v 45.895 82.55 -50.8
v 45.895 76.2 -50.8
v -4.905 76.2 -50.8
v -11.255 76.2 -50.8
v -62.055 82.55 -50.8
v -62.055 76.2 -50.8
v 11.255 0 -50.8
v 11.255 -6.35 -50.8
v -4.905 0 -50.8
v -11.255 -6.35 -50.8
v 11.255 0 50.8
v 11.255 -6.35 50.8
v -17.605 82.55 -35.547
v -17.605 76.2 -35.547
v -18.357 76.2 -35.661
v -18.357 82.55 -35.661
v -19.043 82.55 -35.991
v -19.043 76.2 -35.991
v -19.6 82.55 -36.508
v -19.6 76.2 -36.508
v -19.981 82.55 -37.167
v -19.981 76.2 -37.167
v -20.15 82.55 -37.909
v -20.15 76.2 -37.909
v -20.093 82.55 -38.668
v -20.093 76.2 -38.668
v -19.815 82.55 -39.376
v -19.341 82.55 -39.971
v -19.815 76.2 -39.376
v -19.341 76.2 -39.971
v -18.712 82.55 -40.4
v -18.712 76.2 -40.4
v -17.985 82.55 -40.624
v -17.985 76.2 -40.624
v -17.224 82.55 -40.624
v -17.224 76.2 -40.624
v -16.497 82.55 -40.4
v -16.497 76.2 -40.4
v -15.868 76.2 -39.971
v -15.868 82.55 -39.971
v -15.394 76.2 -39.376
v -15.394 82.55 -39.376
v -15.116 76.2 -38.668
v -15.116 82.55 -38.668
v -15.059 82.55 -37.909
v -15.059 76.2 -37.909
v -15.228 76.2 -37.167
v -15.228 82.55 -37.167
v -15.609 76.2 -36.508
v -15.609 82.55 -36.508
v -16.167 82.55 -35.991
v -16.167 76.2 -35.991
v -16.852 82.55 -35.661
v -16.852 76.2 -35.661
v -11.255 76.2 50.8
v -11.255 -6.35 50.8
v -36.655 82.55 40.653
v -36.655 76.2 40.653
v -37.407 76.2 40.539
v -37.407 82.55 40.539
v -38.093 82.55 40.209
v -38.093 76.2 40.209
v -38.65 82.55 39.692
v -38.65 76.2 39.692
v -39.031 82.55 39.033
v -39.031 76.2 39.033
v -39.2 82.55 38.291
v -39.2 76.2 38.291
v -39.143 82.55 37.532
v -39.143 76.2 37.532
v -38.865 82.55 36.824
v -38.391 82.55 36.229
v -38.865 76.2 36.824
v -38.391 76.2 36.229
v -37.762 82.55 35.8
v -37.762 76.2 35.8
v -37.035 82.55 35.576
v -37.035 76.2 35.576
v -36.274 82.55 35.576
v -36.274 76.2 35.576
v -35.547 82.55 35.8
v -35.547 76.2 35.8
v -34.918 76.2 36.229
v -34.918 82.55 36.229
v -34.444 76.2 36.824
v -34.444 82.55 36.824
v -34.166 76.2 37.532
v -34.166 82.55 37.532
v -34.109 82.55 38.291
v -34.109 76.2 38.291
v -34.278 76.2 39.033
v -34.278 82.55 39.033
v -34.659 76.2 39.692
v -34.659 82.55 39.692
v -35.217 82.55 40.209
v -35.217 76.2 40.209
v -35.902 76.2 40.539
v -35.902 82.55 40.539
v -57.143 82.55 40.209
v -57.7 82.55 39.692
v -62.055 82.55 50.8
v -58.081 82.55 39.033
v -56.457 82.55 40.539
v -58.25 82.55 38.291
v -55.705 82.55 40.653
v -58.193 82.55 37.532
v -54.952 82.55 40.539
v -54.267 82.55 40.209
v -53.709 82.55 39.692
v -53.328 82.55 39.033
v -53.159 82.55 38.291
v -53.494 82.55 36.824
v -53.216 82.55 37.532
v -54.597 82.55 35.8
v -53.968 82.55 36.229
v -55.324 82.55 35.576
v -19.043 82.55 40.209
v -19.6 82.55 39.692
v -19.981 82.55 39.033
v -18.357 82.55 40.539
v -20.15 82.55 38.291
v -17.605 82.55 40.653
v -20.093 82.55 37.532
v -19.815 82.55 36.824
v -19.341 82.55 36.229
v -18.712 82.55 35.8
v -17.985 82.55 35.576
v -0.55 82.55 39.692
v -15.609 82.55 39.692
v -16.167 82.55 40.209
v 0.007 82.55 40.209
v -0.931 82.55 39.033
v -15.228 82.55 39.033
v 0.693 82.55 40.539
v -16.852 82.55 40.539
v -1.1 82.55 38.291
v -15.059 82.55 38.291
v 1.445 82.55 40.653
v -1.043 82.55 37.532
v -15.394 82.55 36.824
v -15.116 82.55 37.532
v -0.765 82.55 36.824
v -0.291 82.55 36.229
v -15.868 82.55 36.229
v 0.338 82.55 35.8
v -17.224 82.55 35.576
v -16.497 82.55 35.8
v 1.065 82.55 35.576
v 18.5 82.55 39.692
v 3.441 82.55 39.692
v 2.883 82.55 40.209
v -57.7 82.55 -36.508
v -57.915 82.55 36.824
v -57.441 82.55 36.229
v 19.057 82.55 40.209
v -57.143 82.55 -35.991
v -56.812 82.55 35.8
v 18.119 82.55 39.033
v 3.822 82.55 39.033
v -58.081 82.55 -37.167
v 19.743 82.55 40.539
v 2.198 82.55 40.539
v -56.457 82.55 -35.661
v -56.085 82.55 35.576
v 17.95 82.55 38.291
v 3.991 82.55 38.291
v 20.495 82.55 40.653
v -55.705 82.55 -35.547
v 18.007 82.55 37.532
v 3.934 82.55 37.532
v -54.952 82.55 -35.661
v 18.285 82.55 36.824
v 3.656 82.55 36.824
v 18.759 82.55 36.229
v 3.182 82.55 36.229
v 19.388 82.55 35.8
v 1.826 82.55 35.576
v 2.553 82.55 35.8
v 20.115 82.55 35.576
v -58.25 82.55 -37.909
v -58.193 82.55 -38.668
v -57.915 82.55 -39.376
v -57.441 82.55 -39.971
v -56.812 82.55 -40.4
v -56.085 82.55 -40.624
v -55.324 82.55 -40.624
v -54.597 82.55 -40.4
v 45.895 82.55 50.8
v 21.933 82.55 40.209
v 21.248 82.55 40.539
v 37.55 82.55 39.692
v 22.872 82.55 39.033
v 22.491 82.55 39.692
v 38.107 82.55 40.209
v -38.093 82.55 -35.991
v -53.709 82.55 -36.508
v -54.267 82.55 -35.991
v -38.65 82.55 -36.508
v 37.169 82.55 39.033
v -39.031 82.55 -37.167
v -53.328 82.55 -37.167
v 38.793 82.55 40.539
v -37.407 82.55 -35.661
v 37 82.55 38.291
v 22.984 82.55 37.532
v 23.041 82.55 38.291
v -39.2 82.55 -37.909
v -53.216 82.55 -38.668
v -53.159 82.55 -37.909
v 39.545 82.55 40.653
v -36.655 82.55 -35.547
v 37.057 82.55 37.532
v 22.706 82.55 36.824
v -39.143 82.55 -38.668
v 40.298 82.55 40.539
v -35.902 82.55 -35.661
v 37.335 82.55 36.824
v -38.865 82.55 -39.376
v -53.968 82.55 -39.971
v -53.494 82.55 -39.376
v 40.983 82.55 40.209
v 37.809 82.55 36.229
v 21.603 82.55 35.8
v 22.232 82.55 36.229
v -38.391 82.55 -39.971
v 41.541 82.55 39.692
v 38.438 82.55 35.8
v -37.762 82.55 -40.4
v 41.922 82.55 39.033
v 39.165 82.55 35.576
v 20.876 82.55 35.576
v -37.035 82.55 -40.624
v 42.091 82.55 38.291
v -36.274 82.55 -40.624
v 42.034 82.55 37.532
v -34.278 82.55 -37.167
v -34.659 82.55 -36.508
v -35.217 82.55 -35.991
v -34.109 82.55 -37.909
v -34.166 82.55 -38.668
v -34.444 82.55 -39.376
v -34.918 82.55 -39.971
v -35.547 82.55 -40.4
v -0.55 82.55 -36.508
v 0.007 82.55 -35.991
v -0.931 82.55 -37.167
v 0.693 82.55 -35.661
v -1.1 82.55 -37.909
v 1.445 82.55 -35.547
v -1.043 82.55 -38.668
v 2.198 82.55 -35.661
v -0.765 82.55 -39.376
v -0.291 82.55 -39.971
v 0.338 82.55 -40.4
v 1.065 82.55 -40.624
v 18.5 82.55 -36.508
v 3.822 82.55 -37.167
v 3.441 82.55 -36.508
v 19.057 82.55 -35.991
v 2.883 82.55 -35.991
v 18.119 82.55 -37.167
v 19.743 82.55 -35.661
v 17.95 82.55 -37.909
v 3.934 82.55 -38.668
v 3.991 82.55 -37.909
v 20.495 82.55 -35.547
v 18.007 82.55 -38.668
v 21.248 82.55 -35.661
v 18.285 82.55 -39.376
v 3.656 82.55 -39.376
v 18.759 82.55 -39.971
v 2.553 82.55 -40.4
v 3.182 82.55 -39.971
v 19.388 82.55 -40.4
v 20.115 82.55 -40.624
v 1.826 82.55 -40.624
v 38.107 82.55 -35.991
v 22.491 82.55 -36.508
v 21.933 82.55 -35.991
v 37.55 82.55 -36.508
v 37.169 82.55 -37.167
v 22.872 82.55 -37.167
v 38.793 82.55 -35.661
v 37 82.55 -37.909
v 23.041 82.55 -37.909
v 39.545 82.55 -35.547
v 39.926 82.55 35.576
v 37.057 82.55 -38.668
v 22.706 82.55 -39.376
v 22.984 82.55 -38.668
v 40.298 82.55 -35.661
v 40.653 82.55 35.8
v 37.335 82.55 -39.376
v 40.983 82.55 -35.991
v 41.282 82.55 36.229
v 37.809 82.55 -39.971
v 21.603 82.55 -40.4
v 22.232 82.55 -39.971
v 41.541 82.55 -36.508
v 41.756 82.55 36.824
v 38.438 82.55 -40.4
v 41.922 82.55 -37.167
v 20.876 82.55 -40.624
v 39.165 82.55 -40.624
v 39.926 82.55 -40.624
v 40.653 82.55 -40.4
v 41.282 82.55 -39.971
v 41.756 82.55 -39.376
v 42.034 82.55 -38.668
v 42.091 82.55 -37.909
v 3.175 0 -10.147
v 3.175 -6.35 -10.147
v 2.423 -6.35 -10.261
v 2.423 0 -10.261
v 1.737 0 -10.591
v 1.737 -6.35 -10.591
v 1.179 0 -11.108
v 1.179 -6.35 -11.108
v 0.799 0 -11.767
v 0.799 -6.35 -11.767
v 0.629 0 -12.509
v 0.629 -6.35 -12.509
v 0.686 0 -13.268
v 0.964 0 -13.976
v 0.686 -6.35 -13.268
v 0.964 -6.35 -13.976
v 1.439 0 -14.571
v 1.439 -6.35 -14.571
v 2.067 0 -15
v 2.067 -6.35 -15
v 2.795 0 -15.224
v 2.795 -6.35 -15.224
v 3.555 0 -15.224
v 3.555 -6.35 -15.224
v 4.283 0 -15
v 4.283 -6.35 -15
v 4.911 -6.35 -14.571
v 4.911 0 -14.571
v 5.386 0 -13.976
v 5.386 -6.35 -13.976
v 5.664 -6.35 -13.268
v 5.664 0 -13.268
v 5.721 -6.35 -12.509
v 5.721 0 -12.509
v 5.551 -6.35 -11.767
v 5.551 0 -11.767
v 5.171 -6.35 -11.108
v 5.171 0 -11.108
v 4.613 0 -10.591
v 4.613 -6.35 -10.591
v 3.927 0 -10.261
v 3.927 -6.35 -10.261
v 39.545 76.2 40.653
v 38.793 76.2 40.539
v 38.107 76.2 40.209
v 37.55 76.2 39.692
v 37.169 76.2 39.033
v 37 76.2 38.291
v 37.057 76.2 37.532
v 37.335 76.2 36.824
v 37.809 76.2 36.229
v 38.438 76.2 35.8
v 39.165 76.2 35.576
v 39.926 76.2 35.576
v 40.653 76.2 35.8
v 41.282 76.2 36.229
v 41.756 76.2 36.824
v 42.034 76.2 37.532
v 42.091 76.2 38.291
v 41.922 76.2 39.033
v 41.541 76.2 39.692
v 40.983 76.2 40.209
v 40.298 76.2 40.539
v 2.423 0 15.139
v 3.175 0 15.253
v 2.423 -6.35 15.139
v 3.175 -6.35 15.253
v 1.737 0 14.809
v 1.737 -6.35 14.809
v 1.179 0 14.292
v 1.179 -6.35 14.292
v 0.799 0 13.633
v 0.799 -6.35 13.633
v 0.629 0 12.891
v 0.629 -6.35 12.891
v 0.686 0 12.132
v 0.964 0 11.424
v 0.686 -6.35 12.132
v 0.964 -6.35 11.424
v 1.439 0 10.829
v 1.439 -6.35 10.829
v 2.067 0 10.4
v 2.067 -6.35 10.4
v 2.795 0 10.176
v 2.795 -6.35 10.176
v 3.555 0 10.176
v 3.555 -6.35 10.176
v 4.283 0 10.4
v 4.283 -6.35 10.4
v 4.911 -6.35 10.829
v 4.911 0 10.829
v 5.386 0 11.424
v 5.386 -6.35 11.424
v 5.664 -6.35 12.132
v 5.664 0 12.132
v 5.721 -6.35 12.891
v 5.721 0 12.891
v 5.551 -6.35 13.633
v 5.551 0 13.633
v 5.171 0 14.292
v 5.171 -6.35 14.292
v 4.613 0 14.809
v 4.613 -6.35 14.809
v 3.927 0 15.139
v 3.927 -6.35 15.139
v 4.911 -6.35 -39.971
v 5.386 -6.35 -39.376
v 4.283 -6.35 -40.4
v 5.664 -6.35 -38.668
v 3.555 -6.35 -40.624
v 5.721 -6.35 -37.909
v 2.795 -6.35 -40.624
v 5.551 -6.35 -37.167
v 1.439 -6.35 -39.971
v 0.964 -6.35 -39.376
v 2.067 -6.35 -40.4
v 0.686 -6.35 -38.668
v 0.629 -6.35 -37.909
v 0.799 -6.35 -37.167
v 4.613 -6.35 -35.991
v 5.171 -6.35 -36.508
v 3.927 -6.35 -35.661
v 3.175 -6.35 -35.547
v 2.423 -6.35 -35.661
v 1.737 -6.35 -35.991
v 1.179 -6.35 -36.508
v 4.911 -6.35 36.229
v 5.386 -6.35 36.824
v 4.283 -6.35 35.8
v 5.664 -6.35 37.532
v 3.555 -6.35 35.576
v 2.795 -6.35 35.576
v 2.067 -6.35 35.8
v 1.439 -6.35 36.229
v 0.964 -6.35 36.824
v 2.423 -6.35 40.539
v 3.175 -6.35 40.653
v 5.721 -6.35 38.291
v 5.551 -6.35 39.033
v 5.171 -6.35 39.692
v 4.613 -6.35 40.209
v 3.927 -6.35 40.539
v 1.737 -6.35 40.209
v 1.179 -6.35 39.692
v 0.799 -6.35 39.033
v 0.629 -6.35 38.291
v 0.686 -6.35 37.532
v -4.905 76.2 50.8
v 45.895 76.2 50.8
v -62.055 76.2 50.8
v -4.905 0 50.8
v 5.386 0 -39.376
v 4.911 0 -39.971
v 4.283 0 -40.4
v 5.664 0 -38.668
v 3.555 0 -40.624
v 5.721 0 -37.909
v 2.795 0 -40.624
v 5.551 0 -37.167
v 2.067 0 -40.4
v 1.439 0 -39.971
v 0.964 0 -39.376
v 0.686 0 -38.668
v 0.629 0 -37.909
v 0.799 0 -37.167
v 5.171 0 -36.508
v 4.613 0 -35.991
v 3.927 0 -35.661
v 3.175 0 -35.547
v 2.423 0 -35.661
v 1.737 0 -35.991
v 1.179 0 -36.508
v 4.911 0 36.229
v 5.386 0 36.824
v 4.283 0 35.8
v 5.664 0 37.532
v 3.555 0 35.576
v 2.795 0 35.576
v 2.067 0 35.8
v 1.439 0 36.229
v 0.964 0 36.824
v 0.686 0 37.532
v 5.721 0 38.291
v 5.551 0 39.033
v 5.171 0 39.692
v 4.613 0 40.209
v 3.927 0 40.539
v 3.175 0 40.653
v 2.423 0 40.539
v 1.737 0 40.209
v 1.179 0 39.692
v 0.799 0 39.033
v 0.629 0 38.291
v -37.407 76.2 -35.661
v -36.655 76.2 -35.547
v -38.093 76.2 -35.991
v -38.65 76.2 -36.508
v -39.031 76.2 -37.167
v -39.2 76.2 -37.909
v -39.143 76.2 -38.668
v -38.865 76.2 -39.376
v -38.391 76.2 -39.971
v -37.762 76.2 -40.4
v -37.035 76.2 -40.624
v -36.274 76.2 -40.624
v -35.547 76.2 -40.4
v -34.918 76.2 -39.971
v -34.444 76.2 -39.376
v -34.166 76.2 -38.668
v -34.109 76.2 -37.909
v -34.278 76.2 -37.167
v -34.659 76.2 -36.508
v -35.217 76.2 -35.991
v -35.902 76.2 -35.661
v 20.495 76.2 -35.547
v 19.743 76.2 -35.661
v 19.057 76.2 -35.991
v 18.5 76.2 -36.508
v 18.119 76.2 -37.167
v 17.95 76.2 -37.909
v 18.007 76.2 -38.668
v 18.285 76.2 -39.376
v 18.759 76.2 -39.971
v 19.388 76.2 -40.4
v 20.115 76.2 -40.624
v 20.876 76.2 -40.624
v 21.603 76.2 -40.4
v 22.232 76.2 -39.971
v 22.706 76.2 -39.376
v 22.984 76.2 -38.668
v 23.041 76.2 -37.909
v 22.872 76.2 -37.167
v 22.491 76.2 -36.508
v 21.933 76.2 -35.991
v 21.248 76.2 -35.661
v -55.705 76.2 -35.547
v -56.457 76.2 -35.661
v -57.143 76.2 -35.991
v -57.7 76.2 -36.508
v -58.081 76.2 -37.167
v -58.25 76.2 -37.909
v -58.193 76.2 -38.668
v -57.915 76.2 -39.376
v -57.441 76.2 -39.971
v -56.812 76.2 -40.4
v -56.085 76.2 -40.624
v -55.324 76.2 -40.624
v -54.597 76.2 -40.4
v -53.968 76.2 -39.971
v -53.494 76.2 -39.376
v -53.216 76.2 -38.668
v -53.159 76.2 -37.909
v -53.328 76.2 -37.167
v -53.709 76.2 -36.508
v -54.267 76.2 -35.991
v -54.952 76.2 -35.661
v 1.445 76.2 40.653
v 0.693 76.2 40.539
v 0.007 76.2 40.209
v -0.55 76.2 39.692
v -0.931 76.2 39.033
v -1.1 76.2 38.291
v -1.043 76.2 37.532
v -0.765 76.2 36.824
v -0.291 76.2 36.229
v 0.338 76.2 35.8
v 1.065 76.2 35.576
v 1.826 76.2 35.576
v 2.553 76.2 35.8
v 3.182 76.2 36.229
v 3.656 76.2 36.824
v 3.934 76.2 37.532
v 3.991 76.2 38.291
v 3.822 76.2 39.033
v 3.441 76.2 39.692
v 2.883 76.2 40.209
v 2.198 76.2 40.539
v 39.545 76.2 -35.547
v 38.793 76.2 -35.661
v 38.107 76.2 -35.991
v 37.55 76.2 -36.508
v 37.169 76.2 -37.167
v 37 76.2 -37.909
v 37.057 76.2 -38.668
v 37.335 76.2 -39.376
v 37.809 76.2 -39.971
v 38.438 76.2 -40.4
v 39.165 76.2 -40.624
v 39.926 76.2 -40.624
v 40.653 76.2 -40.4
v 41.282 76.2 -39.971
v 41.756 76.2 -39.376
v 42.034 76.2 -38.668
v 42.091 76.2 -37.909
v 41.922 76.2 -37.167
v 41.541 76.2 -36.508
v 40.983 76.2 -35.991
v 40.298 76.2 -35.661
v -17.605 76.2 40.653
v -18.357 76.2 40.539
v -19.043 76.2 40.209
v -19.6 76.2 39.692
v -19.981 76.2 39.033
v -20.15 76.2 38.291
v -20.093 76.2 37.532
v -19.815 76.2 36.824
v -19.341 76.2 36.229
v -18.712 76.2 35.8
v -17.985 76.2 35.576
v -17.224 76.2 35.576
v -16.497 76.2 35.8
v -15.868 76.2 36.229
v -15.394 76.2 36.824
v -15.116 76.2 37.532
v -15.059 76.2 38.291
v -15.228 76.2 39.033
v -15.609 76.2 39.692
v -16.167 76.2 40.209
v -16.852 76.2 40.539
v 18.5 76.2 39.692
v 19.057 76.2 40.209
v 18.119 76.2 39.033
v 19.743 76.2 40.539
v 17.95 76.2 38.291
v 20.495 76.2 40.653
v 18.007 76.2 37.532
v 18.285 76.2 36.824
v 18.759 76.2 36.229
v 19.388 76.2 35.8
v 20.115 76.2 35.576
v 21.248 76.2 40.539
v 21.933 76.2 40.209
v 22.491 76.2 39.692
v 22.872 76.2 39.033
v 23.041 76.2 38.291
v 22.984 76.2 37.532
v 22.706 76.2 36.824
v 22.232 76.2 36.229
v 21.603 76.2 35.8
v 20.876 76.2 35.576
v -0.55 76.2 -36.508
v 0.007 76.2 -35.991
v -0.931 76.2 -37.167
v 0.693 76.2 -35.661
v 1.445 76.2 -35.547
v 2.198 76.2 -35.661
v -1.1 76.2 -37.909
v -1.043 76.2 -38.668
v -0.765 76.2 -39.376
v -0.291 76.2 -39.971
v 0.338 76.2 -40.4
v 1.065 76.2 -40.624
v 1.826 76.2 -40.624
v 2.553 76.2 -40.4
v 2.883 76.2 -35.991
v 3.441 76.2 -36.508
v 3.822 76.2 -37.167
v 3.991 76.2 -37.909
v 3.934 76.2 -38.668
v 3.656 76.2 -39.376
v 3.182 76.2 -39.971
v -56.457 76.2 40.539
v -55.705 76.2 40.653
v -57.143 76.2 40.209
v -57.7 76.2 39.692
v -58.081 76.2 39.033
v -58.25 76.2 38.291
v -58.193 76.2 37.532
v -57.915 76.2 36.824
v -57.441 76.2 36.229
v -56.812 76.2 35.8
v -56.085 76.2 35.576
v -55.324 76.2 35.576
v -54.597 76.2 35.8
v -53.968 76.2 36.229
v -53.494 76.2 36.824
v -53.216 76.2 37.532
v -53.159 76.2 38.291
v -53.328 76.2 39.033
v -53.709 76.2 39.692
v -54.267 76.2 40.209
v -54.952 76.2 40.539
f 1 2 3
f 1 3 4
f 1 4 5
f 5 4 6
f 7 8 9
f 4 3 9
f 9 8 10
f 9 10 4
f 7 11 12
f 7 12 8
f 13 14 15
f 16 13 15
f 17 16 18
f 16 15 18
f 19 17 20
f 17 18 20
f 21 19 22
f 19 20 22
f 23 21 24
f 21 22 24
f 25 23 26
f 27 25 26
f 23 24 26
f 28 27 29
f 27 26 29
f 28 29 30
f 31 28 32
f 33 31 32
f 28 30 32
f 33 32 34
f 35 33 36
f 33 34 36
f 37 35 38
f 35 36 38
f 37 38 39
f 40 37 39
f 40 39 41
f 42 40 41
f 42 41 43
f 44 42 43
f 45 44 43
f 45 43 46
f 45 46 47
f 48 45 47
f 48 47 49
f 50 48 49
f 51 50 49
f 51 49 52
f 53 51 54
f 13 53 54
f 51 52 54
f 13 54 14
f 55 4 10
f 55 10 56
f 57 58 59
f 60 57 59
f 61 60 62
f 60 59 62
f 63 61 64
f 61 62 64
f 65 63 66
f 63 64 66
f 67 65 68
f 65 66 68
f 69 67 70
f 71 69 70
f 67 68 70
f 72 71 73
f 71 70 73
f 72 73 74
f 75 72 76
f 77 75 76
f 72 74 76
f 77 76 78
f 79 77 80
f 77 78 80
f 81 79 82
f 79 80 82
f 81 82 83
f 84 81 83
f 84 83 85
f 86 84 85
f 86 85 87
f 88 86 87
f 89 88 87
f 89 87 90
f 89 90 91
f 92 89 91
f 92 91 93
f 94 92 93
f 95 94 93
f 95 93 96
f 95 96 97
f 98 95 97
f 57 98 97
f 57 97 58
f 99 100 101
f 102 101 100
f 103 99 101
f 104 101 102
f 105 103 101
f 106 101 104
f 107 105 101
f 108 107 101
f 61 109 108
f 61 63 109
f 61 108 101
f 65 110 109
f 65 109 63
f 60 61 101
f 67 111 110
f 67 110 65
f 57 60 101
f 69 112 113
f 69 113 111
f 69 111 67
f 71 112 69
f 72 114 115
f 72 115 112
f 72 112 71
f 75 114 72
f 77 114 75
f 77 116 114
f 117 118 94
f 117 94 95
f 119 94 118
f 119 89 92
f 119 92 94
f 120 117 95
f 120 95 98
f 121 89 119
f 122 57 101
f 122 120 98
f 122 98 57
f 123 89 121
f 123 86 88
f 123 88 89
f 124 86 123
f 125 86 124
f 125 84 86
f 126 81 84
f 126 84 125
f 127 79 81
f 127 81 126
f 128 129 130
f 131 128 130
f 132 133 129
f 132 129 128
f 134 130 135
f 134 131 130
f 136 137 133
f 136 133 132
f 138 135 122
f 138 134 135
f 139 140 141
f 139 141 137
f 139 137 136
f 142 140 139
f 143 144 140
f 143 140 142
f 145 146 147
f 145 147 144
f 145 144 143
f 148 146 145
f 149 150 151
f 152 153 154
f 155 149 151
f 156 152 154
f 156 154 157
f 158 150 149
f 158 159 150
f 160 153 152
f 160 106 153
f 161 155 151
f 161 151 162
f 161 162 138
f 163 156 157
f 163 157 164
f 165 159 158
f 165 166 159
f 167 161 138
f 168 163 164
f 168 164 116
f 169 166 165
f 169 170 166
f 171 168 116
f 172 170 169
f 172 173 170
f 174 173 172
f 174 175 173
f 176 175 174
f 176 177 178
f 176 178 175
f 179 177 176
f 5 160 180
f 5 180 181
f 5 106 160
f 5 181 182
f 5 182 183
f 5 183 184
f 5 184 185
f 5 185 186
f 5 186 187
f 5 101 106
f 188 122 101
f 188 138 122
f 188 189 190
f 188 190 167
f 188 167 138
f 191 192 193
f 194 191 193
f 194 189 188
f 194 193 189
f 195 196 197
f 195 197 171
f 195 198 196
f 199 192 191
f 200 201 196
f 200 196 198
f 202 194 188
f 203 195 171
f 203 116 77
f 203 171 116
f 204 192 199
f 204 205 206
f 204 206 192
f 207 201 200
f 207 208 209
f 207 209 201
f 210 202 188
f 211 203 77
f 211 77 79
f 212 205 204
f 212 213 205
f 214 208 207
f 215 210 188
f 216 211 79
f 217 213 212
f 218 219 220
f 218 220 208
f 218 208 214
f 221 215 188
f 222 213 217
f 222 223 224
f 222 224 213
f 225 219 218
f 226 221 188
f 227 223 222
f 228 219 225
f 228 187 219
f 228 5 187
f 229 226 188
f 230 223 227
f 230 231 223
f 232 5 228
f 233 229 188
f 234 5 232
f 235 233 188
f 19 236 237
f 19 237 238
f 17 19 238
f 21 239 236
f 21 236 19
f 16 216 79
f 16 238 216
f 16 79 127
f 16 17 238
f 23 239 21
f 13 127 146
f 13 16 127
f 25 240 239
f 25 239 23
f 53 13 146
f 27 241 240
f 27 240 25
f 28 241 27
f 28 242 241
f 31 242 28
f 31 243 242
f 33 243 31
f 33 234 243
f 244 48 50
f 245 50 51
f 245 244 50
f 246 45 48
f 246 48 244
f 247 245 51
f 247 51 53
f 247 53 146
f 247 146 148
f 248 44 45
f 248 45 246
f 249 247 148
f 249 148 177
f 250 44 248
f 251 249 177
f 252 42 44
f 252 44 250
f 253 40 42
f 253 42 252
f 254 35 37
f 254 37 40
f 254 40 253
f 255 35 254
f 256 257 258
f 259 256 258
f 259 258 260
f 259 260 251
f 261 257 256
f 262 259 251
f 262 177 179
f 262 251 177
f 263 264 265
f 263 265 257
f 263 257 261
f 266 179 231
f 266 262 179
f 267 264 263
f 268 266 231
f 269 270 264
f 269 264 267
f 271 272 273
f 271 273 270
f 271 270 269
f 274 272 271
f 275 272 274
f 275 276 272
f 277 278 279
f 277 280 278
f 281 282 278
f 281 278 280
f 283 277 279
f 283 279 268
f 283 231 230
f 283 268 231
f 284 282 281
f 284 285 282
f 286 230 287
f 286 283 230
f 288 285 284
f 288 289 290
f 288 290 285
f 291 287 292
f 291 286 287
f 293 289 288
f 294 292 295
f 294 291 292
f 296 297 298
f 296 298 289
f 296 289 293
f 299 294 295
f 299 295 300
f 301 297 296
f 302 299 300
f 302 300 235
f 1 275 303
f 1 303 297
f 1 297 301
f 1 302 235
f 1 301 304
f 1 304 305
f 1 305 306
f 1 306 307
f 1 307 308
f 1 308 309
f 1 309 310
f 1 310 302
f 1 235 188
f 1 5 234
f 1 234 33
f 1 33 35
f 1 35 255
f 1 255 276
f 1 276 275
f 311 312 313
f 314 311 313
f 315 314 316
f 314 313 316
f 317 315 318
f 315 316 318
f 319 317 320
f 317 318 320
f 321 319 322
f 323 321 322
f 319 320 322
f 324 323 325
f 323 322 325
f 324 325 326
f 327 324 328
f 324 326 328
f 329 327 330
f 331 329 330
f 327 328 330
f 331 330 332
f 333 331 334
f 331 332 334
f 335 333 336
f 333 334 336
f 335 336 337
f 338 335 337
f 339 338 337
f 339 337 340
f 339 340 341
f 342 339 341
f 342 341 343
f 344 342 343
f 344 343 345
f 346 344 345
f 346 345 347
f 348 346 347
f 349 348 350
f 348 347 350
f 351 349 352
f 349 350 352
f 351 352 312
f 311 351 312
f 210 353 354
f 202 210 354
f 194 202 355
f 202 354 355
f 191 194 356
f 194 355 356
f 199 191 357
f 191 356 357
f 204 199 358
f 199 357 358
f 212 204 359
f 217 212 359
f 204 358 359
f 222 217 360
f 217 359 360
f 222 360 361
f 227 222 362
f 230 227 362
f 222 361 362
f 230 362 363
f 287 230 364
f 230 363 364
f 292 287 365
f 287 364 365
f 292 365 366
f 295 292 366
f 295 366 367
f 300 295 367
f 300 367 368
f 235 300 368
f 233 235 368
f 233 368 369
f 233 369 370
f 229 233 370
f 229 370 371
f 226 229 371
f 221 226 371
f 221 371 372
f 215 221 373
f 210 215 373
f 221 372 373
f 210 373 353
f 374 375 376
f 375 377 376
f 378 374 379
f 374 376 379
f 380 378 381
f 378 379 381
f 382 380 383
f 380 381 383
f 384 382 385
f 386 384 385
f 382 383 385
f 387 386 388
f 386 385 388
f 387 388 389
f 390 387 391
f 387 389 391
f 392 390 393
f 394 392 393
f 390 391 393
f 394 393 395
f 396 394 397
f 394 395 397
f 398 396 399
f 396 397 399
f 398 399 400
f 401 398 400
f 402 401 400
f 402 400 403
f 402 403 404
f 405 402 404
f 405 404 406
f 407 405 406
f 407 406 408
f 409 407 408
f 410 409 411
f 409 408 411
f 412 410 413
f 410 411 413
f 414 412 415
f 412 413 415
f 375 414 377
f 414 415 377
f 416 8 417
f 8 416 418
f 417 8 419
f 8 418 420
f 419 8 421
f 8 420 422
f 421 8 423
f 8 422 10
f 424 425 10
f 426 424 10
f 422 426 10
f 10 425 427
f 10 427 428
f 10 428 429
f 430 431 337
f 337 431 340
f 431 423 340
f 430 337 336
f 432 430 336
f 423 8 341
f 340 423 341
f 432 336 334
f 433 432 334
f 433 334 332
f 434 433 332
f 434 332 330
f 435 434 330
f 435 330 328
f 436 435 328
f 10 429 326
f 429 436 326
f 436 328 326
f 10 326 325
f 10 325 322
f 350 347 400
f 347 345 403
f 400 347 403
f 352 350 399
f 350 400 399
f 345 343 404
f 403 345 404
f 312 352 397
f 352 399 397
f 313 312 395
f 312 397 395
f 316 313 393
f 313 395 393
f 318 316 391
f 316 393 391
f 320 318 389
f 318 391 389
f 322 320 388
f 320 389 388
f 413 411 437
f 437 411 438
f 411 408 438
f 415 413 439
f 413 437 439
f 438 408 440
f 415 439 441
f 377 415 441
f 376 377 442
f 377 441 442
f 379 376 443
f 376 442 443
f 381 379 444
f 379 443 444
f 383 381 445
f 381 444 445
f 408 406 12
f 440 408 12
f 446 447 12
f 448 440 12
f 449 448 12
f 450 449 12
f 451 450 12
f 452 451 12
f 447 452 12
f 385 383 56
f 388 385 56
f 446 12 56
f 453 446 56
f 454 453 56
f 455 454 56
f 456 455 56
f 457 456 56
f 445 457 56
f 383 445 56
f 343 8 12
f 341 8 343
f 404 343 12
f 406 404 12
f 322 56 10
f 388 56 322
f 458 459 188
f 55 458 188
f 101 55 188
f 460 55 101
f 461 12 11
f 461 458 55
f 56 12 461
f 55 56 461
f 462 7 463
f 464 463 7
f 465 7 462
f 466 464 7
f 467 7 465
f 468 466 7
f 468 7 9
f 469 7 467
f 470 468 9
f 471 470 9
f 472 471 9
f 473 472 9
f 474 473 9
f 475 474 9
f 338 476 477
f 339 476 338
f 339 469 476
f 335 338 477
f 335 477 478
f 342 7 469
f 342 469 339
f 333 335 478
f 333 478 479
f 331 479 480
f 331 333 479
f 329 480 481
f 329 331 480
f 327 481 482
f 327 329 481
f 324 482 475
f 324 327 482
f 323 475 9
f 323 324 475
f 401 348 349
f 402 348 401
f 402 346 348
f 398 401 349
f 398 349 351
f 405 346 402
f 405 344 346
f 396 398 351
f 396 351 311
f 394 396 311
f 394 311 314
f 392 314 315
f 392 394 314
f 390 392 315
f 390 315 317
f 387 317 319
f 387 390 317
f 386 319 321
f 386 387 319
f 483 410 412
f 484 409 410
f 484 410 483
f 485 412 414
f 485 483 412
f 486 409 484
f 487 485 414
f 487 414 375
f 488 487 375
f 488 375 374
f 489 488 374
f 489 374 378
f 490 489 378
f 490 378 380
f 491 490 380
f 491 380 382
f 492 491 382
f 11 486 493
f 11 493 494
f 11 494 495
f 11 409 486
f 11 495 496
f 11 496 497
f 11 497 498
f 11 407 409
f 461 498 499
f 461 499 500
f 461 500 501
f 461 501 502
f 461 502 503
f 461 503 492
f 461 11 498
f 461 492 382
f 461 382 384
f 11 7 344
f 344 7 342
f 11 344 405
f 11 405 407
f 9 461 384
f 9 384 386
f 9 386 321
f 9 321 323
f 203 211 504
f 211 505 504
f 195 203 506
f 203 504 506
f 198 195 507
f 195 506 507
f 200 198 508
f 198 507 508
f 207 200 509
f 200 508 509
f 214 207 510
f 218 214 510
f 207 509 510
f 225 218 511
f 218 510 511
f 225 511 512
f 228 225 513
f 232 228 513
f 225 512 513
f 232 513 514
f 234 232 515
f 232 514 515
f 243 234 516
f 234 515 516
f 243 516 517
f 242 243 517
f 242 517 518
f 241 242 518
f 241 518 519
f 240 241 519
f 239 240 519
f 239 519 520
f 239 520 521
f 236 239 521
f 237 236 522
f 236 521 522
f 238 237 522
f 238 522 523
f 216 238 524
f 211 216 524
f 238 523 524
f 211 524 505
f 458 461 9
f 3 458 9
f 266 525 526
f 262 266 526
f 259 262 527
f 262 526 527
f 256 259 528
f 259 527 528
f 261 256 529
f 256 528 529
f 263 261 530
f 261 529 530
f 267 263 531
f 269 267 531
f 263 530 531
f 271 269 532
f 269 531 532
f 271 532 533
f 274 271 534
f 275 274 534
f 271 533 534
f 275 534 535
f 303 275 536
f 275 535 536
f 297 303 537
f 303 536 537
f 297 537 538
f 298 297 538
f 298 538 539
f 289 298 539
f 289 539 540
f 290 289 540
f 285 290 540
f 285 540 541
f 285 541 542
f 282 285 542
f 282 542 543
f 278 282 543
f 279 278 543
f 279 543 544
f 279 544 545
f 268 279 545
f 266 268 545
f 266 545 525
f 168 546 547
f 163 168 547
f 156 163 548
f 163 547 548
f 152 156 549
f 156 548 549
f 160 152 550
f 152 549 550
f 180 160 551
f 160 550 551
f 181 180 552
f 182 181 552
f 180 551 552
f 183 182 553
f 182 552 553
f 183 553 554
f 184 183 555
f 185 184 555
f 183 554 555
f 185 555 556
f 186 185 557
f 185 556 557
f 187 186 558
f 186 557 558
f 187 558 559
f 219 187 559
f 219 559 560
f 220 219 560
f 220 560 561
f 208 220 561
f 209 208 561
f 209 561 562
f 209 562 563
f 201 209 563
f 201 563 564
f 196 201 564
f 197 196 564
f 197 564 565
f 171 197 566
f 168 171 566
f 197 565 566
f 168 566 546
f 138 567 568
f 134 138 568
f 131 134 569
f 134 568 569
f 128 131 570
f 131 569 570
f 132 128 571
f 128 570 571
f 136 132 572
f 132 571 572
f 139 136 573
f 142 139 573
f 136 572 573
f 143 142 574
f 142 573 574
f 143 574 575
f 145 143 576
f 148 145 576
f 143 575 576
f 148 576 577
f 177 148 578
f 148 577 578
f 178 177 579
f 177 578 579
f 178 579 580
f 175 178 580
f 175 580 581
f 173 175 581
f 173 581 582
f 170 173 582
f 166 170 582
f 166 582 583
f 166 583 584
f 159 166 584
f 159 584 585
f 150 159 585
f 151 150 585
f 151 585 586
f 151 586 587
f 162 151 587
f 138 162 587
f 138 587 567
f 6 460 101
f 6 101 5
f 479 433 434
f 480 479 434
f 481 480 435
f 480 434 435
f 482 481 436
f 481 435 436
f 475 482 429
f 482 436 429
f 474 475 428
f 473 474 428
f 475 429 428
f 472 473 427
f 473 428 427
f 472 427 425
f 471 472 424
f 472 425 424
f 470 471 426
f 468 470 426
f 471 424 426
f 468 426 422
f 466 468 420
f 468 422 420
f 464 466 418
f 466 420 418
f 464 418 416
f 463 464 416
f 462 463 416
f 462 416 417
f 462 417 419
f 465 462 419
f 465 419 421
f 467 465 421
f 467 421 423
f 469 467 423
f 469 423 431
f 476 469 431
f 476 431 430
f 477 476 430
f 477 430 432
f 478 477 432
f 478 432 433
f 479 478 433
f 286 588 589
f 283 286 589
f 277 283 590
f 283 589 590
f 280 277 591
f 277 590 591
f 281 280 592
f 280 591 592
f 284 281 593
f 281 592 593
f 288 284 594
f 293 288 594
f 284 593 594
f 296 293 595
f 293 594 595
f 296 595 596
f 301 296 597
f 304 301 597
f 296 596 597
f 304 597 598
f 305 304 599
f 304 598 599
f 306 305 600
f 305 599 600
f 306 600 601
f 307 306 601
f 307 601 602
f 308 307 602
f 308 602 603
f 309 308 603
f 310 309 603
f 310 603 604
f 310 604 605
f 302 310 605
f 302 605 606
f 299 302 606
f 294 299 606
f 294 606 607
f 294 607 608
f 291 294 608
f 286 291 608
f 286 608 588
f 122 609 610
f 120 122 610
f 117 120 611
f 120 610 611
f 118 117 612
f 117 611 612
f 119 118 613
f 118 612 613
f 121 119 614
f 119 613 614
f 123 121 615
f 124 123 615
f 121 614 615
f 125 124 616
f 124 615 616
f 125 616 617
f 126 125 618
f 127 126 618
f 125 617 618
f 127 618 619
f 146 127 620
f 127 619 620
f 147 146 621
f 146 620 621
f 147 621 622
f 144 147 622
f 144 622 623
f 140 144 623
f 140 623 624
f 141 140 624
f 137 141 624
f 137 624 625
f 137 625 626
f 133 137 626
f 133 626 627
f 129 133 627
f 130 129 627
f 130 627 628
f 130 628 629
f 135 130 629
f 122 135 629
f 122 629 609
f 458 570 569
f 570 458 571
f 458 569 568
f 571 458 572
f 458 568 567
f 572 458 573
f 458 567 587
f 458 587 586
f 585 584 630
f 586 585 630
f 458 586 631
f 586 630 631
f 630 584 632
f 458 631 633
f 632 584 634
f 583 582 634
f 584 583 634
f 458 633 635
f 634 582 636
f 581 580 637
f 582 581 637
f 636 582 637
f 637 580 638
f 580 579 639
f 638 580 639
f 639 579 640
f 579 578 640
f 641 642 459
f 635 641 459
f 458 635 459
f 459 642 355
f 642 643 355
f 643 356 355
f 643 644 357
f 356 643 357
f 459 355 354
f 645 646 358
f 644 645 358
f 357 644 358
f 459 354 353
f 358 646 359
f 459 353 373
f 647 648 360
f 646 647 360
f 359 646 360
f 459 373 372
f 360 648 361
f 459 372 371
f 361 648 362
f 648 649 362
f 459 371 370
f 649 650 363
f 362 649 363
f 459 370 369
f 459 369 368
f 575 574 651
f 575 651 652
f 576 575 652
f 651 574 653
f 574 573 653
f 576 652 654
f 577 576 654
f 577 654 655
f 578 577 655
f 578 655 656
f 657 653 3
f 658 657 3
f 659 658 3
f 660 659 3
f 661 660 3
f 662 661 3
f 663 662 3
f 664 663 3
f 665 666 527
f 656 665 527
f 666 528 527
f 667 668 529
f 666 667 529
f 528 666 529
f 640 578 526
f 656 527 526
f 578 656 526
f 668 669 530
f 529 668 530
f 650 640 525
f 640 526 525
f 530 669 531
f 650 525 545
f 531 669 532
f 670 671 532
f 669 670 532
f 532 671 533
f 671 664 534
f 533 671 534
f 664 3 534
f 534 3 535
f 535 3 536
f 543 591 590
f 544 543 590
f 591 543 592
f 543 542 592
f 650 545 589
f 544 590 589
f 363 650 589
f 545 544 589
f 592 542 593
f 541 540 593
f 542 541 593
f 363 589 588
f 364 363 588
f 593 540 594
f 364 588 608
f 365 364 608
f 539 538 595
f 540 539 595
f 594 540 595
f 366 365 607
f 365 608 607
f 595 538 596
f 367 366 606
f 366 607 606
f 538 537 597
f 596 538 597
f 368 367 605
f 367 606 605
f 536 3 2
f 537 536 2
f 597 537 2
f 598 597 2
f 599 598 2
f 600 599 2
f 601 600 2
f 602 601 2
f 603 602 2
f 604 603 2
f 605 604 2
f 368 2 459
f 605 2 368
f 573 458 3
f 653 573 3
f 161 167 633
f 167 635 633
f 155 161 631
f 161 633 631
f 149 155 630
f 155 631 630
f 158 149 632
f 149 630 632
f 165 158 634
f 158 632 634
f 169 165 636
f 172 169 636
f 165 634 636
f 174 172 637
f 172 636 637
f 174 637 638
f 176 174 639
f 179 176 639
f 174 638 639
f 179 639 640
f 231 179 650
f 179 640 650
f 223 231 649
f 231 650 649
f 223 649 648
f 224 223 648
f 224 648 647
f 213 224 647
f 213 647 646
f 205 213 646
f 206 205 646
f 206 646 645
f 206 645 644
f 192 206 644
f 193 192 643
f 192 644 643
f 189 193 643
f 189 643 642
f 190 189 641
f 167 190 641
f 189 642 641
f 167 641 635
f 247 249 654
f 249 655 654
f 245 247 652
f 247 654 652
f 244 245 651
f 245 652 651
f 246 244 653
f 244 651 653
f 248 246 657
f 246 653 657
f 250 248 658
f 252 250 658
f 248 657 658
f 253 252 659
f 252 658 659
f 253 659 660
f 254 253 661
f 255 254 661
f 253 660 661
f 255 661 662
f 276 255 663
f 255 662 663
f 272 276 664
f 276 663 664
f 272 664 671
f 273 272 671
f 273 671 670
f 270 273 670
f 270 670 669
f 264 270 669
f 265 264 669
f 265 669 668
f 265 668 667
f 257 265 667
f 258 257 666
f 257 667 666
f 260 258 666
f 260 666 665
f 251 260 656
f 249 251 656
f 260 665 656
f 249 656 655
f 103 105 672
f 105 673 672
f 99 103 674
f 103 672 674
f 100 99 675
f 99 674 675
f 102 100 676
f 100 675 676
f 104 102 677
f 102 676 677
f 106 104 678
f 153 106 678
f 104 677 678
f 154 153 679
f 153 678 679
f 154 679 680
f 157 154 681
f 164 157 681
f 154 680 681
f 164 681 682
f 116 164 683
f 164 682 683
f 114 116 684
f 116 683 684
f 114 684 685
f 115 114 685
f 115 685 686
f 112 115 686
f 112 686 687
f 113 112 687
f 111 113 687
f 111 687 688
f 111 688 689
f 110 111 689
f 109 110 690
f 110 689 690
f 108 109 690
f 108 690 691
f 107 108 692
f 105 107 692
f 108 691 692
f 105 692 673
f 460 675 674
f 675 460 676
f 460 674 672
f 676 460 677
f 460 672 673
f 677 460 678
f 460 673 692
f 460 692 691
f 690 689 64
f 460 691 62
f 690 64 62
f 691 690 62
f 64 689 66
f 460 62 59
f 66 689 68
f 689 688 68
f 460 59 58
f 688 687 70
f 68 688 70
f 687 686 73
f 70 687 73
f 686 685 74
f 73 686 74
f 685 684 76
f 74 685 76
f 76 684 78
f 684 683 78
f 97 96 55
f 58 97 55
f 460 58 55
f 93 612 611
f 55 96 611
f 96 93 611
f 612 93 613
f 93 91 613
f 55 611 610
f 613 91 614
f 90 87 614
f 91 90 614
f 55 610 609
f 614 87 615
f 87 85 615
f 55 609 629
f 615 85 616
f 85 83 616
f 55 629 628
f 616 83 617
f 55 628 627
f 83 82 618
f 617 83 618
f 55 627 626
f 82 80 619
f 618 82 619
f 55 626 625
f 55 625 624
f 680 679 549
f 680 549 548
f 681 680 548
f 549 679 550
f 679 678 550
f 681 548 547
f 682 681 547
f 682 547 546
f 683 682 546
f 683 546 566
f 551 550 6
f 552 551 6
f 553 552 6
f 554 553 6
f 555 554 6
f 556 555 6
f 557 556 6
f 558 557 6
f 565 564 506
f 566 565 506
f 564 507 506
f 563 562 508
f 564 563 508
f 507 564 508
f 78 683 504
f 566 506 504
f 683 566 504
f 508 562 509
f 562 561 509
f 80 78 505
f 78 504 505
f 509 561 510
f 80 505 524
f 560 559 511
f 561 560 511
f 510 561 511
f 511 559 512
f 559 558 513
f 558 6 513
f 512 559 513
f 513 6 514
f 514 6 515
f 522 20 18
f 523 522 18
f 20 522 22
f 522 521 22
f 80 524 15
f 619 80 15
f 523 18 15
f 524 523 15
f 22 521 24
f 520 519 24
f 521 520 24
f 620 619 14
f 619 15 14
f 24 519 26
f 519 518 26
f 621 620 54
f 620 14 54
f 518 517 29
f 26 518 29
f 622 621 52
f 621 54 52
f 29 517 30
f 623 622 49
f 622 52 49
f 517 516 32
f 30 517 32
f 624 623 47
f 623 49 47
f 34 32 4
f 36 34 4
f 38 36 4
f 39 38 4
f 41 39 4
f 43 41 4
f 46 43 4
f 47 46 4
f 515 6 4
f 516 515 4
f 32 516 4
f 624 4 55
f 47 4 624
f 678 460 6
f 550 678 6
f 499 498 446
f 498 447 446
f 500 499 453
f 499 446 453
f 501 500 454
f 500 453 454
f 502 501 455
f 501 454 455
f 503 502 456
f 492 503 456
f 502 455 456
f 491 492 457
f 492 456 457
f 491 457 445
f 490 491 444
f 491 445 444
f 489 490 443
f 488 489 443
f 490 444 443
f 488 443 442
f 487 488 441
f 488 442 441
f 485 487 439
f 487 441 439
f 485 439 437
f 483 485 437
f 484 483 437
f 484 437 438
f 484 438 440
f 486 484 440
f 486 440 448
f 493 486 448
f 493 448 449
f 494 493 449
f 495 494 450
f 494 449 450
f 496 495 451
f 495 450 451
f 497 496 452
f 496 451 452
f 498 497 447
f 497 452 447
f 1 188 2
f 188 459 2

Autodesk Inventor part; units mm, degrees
ref_plane "YZ Plane" through (0, 0, 0) normal (1, 0, 0) x (0, 1, 0)
ref_plane "XZ Plane" through (0, 0, 0) normal (0, 1, 0) x (-1, 0, 0)
ref_plane "XY Plane" through (0, 0, 0) normal (0, 0, 1) x (1, 0, 0)
sketch "Sketch1" plane through (0, 0, 0) normal (0, 1, 0) x (-1, 0, 0)
  line L0 (11.2547, 50.8) -> (-11.2547, 50.8)
  line L1 (-11.2547, 50.8) -> (-11.2547, -50.8)
  line L2 (-11.2547, -50.8) -> (11.2547, -50.8)
  line L3 (11.2547, -50.8) -> (11.2547, 50.8)
  line L4 (11.2547, 50.8) -> (-11.2547, -50.8) construction
  line L5 (-11.2547, 50.8) -> (11.2547, -50.8) construction
  point P0 (0, 0)
  dimension "d0" = 101.6
  dimension "d1" = 22.5095
extrude "Extrusion1" add sketch "Sketch1" against normal blind 6.35
sketch "Sketch2" plane through (0, 0, 0) normal (0, 1, 0) x (1, 0, 0)
  line L0 (11.2547, -50.8) -> (-11.2547, -50.8) projected
  line L1 (-11.2547, 50.8) -> (11.2547, 50.8) projected
  line L2 (-11.2547, -50.8) -> (-4.9047, -50.8)
  line L3 (-4.9047, -50.8) -> (-4.9047, 50.8)
  line L4 (-4.9047, 50.8) -> (-11.2547, 50.8)
  line L5 (-11.2547, 50.8) -> (-11.2547, -50.8)
  point P0 (0, 0)
  dimension "d4" = 6.35
extrude "Extrusion2" add sketch "Sketch2" along normal blind 76.2
sketch "Sketch3" plane through (0, 76.2, 0) normal (0, 1, 0) x (1, 0, 0)
  line L0 (11.2547, -50.8) -> (-11.2547, -50.8) projected
  line L1 (-11.2547, -50.8) -> (-62.0547, -50.8)
  line L2 (-62.0547, -50.8) -> (-62.0547, 50.8)
  line L3 (-62.0547, 50.8) -> (-11.2547, 50.8)
  line L4 (-11.2547, 50.8) -> (-11.2547, -50.8)
  line L5 (-4.9047, -50.8) -> (-4.9047, 50.8) projected
  line L6 (-4.9047, 50.8) -> (-11.2547, 50.8) projected
  line L7 (-11.2547, -50.8) -> (-4.9047, -50.8) projected
  line L8 (11.2547, -50.8) -> (11.2547, 50.8) projected
  line L9 (11.2547, 50.8) -> (-4.9047, 50.8) projected
  line L10 (-11.2547, -50.8) -> (-11.2547, 50.8) projected
  line L11 (-11.2547, -50.8) -> (-4.9047, -50.8)
  line L12 (-4.9047, -50.8) -> (-4.9047, 50.8)
  line L13 (-4.9047, 50.8) -> (-11.2547, 50.8)
  line L14 (-11.2547, 50.8) -> (-11.2547, -50.8)
  line L15 (-4.9047, -50.8) -> (45.8953, -50.8)
  line L16 (45.8953, -50.8) -> (45.8953, 50.8)
  line L17 (45.8953, 50.8) -> (-4.9047, 50.8)
  line L18 (-4.9047, 50.8) -> (-4.9047, -50.8)
  point P0 (0, 0)
  dimension "d7" = 50.8
  dimension "d8" = 50.8
extrude "Extrusion3" add sketch "Sketch3" along normal blind 6.35
sketch "Sketch4" plane through (0, 0, 0) normal (0, 1, 0) x (1, 0, 0)
  line L0 (-4.9047, -50.8) -> (11.2547, -50.8) construction
  line L1 (3.175, -50.8) -> (3.175, 50.8) construction
  line L2 (-11.2547, 50.8) -> (11.2547, 50.8) construction
  point P0 (0, 0)
  point P1 (3.175, -38.1)
  point P2 (3.175, -12.7)
  point P3 (3.175, 12.7)
  point P4 (3.175, 38.1)
  dimension "d11" = 12.7
  dimension "d14" = 25.4
hole "Hole1" at (3.175, 0, 38.1) at (3.175, 0, 12.7) at (3.175, 0, -12.7) at (3.175, 0, -38.1) direction (0, -1, 0) diameter 5.1054 end through all clearance for "Hex Machine Screw" size "#10" standard "Ansi Unified Screw Threads"
sketch "Sketch5" plane through (0, 82.55, 0) normal (0, 1, 0) x (1, 0, 0)
  line L0 (-62.0547, 50.8) -> (-62.0547, -50.8) construction
  line L1 (-62.0547, -38.1) -> (42.9055, -38.1) construction
  line L2 (-55.7047, -38.1) -> (-55.7047, 38.1) construction
  point P0 (0, 0)
  point P1 (-36.6547, -38.1)
  point P2 (-36.6547, 38.1)
  point P3 (-17.6047, -38.1)
  point P4 (-17.6047, 38.1)
  point P5 (1.4453, -38.1)
  point P6 (1.4453, 38.1)
  point P7 (20.4953, -38.1)
  point P8 (20.4953, 38.1)
  point P9 (39.5453, -38.1)
  point P10 (39.5453, 38.1)
  point P11 (58.5953, -38.1)
  point P12 (58.5953, 38.1)
  dimension "d26" = 38.1
  dimension "d27" = 76.2
  dimension "d28" = 6.35
  dimension "d31" = 76.2
  dimension "d34" = 19.05
hole "Hole2" at (-55.7047, 82.55, 38.1) at (-55.7047, 82.55, -38.1) at (-36.6547, 82.55, 38.1) at (-36.6547, 82.55, -38.1) at (-17.6047, 82.55, 38.1) at (-17.6047, 82.55, -38.1) at (1.4453, 82.55, 38.1) at (1.4453, 82.55, -38.1) at (20.4953, 82.55, 38.1) at (20.4953, 82.55, -38.1) at (39.5453, 82.55, 38.1) at (39.5453, 82.55, -38.1) at (58.5953, 82.55, 38.1) at (58.5953, 82.55, -38.1) direction (0, -1, 0) diameter 5.1054 depth 6.35 clearance for "Hex Machine Screw" size "#10" standard "Ansi Unified Screw Threads"
equation "\"d0\" = BaseLength"
equation "\"d1\" = BaseWidth"
equation "\"d2\" = BaseThickness"
equation "\"d4\" = BackWidth"
equation "\"d5\" = BackHeight"
equation "\"d7\" = TopBackExtension"
equation "\"d8\" = TopFrontExtension"
equation "\"d9\" = TopThickness"
equation "\"d11\" = offsetForFirstHole"
equation "\"d26\" = 0.5 * holeSpacingForMotorBracket"
equation "\"d27\" = holeSpacingForMotorBracket"
equation "\"d28\" = offsetForBracketHoleFromEdge"
equation "\"d34\" = holeSpacingForVariationInMotorBracketHoles"
equation "\"BaseWidth\" = 22.50948"
equation "\"BaseLength\" = 101.6"
equation "\"BaseThickness\" = 6.35"
equation "\"BackWidth\" = 6.35"
equation "\"BackHeight\" = 76.2"
equation "\"TopBackExtension\" = 50.8"
equation "\"TopFrontExtension\" = 50.8"
equation "\"TopThickness\" = 6.35"
equation "\"offsetForFirstHole\" = 12.7"
equation "\"holeSpacingForMotorBracket\" = 76.2"
equation "\"offsetForBracketHoleFromEdge\" = 6.35"
equation "\"holeSpacingForVariationInMotorBracketHoles\" = 19.05"
properties part number "pullyBracket"
